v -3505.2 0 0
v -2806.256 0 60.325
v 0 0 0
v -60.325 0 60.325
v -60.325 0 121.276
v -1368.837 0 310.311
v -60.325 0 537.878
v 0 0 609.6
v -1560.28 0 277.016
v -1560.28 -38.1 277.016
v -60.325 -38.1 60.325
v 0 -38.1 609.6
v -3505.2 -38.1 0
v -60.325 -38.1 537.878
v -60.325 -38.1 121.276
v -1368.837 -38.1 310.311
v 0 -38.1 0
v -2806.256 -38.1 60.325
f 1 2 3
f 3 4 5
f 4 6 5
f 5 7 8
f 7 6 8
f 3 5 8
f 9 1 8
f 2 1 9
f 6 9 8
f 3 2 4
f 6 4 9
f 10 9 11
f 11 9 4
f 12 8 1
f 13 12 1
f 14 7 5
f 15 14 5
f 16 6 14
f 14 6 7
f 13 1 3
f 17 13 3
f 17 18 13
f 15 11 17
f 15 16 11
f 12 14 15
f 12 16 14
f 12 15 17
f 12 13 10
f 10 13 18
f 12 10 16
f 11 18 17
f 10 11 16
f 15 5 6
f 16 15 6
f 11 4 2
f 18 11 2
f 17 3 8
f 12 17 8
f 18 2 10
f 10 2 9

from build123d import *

# Parameters (mm, degrees)
F1_DEPTH = 38.1


with BuildPart() as f1:
    # F0 (on Front) → F1 (new body)
    with BuildSketch(Plane.XZ):
        Polygon((-3505.2, 0), (0, 0), (0, 609.6), align=None)
        Polygon((-2806.255924, 60.325), (-1560.280093, 277.016449), (-60.325, 60.325), align=None, mode=Mode.SUBTRACT)
        Polygon((-60.325, 121.276247), (-1368.837269, 310.310853), (-60.325, 537.878204), align=None, mode=Mode.SUBTRACT)
    extrude(amount=F1_DEPTH)


solid = f1.part
